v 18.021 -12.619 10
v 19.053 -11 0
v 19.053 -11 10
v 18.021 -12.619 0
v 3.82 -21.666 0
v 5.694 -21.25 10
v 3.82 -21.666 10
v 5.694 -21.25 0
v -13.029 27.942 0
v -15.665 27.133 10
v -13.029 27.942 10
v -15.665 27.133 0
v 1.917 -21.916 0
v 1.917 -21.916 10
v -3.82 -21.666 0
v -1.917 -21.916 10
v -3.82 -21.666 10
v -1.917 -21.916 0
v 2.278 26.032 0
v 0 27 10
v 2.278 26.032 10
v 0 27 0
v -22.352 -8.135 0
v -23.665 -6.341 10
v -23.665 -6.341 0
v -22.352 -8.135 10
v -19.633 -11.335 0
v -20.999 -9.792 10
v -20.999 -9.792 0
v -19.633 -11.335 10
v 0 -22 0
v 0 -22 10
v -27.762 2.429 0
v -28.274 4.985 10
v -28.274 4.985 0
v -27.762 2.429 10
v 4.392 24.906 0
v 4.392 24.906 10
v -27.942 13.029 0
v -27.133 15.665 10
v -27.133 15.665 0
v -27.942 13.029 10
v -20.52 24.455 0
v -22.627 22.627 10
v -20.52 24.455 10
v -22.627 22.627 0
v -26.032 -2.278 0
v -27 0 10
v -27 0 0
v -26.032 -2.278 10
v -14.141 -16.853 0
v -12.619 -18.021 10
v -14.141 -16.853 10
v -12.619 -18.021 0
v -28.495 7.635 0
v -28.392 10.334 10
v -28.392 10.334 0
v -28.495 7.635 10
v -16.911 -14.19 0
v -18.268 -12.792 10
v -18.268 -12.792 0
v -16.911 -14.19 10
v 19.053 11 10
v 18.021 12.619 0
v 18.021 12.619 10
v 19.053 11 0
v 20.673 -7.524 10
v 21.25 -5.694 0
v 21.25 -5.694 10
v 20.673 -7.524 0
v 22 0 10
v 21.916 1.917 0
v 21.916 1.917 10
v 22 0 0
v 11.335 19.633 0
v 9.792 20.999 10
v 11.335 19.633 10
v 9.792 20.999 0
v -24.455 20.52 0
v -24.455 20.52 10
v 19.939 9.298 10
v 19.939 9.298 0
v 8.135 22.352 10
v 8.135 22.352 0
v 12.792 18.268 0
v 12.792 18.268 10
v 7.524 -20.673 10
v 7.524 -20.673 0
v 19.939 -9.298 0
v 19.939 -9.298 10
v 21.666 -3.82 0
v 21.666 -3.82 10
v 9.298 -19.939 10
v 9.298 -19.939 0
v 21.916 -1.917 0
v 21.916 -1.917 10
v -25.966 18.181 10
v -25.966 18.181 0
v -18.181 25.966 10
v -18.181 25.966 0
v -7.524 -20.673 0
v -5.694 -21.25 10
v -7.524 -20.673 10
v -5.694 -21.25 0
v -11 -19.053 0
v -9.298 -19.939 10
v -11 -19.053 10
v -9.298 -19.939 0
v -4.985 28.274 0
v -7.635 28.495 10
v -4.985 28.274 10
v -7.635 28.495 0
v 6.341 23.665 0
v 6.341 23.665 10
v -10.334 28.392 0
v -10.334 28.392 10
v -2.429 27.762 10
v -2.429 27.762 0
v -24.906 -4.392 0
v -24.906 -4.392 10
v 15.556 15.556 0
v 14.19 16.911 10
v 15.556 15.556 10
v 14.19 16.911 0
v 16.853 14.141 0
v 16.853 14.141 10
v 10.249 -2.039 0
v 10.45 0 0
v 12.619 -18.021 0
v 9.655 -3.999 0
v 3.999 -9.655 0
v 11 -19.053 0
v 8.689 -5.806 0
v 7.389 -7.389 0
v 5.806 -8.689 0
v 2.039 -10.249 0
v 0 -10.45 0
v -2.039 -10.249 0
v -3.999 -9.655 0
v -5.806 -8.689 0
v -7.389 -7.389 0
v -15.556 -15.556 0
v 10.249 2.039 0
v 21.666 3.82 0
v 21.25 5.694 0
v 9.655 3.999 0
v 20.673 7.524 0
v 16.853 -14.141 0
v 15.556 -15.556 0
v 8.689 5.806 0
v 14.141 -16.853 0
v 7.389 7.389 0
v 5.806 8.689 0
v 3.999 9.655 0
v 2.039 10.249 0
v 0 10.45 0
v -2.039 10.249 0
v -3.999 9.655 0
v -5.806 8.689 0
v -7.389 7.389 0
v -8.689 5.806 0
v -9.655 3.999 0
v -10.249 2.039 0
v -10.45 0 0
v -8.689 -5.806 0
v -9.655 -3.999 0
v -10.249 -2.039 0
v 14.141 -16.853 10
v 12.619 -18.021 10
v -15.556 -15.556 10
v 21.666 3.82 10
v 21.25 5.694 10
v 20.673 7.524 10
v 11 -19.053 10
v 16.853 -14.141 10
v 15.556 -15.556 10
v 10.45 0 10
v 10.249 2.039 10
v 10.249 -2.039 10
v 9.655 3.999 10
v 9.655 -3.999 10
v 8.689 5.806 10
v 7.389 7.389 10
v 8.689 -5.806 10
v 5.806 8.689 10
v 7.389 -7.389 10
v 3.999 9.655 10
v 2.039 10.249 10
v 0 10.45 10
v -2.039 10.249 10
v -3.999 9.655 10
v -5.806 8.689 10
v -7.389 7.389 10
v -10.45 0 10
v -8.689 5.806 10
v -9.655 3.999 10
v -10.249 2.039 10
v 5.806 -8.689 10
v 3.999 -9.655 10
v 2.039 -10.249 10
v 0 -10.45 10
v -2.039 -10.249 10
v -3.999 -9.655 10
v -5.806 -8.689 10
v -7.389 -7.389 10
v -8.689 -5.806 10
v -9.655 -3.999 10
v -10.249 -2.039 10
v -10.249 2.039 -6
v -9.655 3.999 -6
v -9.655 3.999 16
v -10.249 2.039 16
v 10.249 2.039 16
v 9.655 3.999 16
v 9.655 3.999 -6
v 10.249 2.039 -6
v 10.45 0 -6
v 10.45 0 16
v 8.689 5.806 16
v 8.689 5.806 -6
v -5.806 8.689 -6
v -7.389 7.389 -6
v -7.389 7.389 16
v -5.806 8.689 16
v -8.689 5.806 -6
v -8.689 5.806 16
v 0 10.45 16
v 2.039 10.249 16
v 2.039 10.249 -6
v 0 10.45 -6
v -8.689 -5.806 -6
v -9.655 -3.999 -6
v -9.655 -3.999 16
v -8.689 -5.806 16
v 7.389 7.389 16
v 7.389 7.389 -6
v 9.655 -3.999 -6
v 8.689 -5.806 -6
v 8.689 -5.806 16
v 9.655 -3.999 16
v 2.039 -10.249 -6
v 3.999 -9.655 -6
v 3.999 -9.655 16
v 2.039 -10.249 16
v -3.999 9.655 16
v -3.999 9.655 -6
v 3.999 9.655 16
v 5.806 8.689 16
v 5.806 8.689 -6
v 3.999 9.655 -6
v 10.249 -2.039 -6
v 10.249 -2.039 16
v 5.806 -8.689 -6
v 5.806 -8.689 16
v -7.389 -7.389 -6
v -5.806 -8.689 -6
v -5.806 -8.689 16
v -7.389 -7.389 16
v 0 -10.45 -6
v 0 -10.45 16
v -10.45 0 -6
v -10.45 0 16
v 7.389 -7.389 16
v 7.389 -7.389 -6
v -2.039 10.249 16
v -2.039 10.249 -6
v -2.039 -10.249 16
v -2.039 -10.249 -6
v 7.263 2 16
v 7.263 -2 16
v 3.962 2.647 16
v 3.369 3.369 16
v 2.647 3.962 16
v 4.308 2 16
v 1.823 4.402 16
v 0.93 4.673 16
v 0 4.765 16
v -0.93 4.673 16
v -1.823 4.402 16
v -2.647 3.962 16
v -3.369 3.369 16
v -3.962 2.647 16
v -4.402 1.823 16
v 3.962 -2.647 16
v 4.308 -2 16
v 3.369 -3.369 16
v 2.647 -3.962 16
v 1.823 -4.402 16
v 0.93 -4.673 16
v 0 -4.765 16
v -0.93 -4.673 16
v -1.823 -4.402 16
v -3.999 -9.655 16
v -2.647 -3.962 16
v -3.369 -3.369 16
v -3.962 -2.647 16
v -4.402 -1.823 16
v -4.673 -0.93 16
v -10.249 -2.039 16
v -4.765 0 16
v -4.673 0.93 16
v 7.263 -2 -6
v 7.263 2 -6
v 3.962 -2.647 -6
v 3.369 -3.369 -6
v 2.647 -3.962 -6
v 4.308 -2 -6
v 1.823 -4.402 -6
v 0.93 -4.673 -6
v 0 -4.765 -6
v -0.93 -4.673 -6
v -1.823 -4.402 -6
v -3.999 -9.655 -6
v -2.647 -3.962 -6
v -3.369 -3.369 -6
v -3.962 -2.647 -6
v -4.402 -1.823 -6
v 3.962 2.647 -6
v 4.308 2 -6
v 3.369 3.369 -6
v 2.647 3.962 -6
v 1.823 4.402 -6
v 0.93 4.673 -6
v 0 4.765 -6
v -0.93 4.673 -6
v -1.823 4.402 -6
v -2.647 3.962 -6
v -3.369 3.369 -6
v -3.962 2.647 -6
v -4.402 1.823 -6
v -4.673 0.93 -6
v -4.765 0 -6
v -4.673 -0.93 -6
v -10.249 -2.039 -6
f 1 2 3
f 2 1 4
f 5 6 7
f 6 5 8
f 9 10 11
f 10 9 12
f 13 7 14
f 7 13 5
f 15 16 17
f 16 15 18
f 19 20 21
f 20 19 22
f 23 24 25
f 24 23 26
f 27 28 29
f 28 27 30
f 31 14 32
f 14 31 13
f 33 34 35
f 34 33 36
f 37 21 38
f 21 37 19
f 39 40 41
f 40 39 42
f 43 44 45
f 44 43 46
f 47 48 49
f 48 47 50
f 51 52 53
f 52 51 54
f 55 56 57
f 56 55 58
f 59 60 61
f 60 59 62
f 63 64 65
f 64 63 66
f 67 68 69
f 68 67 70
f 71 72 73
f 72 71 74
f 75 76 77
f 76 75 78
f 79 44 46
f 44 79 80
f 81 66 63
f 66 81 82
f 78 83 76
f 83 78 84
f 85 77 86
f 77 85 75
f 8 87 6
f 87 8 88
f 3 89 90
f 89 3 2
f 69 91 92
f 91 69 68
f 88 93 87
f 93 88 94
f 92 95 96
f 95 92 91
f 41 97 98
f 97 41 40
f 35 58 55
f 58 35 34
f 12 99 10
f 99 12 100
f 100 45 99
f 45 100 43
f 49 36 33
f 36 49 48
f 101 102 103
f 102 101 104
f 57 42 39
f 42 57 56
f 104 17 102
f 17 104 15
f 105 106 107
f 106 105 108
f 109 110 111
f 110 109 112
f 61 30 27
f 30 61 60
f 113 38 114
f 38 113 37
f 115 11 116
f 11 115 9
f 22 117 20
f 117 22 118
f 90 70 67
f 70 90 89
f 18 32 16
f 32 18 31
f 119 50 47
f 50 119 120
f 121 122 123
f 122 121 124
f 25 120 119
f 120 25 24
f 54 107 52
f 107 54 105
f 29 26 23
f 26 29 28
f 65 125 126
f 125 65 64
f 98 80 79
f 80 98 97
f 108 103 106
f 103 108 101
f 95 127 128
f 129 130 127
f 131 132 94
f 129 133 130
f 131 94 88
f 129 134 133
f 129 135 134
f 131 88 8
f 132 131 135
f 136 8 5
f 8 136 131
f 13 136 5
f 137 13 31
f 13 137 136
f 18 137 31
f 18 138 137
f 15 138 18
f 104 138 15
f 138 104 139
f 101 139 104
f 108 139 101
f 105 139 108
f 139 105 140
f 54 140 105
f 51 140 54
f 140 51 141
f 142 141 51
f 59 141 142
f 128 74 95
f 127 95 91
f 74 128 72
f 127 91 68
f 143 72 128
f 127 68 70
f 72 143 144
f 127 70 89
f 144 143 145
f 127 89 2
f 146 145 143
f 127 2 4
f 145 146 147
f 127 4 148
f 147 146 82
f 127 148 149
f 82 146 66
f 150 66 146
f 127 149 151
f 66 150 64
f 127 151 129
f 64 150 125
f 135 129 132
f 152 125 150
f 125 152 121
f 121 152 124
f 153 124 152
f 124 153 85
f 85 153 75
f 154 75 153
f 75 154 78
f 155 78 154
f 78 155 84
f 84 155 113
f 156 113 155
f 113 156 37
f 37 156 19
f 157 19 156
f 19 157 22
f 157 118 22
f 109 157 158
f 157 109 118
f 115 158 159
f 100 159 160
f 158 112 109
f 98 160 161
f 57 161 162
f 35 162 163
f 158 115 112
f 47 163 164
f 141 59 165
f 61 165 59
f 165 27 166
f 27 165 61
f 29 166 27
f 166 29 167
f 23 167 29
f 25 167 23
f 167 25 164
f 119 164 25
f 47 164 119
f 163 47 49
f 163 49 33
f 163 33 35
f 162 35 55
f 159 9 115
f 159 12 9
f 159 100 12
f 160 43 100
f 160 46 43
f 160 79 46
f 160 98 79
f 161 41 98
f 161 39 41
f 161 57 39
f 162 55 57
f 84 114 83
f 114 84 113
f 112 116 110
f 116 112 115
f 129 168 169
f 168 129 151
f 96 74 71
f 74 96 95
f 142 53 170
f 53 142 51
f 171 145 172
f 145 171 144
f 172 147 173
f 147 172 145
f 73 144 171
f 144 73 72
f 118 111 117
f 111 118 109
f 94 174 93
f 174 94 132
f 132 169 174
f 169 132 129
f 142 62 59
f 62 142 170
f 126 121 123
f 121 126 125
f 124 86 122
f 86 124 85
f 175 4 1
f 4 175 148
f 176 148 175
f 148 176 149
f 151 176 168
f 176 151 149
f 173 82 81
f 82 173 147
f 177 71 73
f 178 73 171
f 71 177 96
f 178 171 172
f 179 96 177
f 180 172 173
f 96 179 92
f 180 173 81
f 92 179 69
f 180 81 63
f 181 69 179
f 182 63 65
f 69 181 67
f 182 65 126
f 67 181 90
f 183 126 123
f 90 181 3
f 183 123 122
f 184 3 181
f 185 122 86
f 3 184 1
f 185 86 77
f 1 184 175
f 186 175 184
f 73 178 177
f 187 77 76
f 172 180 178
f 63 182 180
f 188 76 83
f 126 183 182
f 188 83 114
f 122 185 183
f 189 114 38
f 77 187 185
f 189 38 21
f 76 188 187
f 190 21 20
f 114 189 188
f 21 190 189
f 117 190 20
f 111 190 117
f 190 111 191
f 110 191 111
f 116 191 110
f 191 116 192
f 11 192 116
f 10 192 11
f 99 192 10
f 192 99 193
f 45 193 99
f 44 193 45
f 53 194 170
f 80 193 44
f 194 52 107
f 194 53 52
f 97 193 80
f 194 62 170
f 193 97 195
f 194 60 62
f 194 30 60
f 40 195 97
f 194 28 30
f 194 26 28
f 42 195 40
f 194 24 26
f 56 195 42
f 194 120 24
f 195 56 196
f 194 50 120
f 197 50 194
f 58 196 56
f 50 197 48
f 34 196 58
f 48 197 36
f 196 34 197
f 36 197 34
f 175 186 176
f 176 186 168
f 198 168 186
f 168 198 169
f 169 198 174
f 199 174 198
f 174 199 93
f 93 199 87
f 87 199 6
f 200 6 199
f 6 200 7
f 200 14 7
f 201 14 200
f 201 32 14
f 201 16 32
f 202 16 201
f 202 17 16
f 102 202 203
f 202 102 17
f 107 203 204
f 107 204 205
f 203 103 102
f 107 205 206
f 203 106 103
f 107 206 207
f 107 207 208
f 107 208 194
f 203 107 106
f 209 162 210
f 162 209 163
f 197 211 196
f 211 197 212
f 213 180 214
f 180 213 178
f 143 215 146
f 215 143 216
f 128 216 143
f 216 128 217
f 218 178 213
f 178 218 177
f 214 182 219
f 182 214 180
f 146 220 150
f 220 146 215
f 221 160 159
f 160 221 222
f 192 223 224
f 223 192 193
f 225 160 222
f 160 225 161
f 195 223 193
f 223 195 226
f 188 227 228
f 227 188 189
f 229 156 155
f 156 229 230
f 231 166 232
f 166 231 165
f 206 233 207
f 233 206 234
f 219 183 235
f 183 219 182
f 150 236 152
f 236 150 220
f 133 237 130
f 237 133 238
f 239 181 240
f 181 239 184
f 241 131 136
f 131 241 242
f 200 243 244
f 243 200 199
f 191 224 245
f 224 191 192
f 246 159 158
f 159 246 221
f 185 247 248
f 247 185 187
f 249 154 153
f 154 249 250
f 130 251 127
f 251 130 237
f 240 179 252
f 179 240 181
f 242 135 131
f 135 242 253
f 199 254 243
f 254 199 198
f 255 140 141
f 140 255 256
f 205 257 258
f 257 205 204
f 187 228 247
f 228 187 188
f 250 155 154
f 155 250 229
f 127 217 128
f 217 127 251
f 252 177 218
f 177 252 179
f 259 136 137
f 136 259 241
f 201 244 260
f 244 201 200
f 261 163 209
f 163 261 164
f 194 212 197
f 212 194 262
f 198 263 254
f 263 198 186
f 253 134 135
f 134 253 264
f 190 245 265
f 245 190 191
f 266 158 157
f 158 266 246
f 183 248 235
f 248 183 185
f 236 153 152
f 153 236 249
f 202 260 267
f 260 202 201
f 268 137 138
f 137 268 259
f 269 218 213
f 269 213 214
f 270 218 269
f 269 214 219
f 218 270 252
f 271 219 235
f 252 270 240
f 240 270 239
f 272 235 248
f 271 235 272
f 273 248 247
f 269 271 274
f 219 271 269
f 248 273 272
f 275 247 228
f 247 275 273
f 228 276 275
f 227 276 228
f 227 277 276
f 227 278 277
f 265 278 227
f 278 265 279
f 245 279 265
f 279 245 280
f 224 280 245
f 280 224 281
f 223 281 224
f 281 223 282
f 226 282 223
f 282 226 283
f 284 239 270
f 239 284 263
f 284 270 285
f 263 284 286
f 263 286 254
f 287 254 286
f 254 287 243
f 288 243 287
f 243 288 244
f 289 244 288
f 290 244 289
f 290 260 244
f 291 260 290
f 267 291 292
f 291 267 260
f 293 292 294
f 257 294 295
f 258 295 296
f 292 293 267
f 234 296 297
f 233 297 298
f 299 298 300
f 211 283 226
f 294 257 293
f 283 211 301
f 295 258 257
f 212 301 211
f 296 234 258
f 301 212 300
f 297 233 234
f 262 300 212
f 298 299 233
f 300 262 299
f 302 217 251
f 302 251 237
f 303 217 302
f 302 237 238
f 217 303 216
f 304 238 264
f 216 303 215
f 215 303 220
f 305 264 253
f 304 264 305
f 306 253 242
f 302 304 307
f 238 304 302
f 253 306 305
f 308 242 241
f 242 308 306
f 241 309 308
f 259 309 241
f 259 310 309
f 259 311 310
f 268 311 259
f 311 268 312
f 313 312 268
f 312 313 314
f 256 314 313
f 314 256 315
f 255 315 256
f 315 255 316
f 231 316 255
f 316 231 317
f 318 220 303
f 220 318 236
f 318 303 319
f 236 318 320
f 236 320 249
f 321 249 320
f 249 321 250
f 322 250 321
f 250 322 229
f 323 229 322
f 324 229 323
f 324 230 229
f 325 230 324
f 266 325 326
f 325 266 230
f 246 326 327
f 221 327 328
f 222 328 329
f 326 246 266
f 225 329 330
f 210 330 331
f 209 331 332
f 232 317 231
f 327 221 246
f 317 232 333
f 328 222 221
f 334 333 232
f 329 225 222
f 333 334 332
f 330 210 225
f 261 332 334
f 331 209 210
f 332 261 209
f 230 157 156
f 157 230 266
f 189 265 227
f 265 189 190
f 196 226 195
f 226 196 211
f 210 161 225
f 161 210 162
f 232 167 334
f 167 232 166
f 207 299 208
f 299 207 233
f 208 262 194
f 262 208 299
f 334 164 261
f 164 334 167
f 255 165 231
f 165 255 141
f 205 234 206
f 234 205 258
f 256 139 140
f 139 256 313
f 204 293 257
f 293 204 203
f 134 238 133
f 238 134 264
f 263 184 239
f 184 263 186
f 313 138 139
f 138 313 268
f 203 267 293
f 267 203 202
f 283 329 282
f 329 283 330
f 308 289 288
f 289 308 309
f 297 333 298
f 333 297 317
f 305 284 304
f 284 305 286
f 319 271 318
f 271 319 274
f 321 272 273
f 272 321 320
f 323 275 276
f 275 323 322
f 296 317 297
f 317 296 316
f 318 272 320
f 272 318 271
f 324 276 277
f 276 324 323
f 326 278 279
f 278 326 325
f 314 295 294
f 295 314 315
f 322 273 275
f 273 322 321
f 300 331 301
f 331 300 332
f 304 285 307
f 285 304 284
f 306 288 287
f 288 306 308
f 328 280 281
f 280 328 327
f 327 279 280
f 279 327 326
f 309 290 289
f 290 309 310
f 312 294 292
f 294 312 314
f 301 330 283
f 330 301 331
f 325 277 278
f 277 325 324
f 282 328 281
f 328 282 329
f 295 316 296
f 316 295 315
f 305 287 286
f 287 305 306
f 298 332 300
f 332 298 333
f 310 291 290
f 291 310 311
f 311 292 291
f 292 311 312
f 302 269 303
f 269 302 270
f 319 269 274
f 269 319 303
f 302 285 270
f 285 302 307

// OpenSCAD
$fn = 32;

// ----------------------------------------------------------------------
// Cam: base radius 22 mm with a 10 mm lift over 180 degrees
// ----------------------------------------------------------------------

// --- parameters (mm) ---
base_r = 22;              // base radius
lift = 10;                // lift height above the base radius
lift_span = 180;          // angular width of the lift
lift_start = 45;          // angle where the lift starts
cam_t = 10;               // cam plate thickness
hub_d = 20.9;             // hub diameter
hub_h = 22;               // hub height
bore_d = 9.53;            // bore
key_w = 4;                // keyway width
key_depth = 2;            // keyway depth

cam_profile = [[22, 0], [21.916, 1.917], [21.666, 3.82], [21.25, 5.694], [20.673, 7.524], [19.939, 9.298], [19.053, 11], [18.021, 12.619], [16.853, 14.141], [15.556, 15.556], [14.19, 16.911], [12.792, 18.268], [11.335, 19.633], [9.792, 20.999], [8.135, 22.352], [6.341, 23.665], [4.392, 24.906], [2.278, 26.032], [0, 27], [-2.429, 27.762], [-4.985, 28.274], [-7.635, 28.495], [-10.334, 28.392], [-13.029, 27.942], [-15.665, 27.133], [-18.181, 25.966], [-20.52, 24.455], [-22.627, 22.627], [-24.455, 20.52], [-25.966, 18.181], [-27.133, 15.665], [-27.942, 13.029], [-28.392, 10.334], [-28.495, 7.635], [-28.274, 4.985], [-27.762, 2.429], [-27, 0], [-26.032, -2.278], [-24.906, -4.392], [-23.665, -6.341], [-22.352, -8.135], [-20.999, -9.792], [-19.633, -11.335], [-18.268, -12.792], [-16.911, -14.19], [-15.556, -15.556], [-14.141, -16.853], [-12.619, -18.021], [-11, -19.053], [-9.298, -19.939], [-7.524, -20.673], [-5.694, -21.25], [-3.82, -21.666], [-1.917, -21.916], [0, -22], [1.917, -21.916], [3.82, -21.666], [5.694, -21.25], [7.524, -20.673], [9.298, -19.939], [11, -19.053], [12.619, -18.021], [14.141, -16.853], [15.556, -15.556], [16.853, -14.141], [18.021, -12.619], [19.053, -11], [19.939, -9.298], [20.673, -7.524], [21.25, -5.694], [21.666, -3.82], [21.916, -1.917]];

difference() {
  union() {
    linear_extrude(height = cam_t) polygon(cam_profile);
    /* hub, proud of the cam plate on both sides */
    translate([0, 0, -6]) cylinder(h = hub_h, d = hub_d);
  }
  /* bore through the hub, 2.5 mm clear on both faces */
  translate([0, 0, -8.5]) cylinder(h = hub_h + 5, d = bore_d);
  /* keyway, milled through the whole hub */
  translate([2.763, -2, -8.5]) cube([4.5, 4, 27]);
}
